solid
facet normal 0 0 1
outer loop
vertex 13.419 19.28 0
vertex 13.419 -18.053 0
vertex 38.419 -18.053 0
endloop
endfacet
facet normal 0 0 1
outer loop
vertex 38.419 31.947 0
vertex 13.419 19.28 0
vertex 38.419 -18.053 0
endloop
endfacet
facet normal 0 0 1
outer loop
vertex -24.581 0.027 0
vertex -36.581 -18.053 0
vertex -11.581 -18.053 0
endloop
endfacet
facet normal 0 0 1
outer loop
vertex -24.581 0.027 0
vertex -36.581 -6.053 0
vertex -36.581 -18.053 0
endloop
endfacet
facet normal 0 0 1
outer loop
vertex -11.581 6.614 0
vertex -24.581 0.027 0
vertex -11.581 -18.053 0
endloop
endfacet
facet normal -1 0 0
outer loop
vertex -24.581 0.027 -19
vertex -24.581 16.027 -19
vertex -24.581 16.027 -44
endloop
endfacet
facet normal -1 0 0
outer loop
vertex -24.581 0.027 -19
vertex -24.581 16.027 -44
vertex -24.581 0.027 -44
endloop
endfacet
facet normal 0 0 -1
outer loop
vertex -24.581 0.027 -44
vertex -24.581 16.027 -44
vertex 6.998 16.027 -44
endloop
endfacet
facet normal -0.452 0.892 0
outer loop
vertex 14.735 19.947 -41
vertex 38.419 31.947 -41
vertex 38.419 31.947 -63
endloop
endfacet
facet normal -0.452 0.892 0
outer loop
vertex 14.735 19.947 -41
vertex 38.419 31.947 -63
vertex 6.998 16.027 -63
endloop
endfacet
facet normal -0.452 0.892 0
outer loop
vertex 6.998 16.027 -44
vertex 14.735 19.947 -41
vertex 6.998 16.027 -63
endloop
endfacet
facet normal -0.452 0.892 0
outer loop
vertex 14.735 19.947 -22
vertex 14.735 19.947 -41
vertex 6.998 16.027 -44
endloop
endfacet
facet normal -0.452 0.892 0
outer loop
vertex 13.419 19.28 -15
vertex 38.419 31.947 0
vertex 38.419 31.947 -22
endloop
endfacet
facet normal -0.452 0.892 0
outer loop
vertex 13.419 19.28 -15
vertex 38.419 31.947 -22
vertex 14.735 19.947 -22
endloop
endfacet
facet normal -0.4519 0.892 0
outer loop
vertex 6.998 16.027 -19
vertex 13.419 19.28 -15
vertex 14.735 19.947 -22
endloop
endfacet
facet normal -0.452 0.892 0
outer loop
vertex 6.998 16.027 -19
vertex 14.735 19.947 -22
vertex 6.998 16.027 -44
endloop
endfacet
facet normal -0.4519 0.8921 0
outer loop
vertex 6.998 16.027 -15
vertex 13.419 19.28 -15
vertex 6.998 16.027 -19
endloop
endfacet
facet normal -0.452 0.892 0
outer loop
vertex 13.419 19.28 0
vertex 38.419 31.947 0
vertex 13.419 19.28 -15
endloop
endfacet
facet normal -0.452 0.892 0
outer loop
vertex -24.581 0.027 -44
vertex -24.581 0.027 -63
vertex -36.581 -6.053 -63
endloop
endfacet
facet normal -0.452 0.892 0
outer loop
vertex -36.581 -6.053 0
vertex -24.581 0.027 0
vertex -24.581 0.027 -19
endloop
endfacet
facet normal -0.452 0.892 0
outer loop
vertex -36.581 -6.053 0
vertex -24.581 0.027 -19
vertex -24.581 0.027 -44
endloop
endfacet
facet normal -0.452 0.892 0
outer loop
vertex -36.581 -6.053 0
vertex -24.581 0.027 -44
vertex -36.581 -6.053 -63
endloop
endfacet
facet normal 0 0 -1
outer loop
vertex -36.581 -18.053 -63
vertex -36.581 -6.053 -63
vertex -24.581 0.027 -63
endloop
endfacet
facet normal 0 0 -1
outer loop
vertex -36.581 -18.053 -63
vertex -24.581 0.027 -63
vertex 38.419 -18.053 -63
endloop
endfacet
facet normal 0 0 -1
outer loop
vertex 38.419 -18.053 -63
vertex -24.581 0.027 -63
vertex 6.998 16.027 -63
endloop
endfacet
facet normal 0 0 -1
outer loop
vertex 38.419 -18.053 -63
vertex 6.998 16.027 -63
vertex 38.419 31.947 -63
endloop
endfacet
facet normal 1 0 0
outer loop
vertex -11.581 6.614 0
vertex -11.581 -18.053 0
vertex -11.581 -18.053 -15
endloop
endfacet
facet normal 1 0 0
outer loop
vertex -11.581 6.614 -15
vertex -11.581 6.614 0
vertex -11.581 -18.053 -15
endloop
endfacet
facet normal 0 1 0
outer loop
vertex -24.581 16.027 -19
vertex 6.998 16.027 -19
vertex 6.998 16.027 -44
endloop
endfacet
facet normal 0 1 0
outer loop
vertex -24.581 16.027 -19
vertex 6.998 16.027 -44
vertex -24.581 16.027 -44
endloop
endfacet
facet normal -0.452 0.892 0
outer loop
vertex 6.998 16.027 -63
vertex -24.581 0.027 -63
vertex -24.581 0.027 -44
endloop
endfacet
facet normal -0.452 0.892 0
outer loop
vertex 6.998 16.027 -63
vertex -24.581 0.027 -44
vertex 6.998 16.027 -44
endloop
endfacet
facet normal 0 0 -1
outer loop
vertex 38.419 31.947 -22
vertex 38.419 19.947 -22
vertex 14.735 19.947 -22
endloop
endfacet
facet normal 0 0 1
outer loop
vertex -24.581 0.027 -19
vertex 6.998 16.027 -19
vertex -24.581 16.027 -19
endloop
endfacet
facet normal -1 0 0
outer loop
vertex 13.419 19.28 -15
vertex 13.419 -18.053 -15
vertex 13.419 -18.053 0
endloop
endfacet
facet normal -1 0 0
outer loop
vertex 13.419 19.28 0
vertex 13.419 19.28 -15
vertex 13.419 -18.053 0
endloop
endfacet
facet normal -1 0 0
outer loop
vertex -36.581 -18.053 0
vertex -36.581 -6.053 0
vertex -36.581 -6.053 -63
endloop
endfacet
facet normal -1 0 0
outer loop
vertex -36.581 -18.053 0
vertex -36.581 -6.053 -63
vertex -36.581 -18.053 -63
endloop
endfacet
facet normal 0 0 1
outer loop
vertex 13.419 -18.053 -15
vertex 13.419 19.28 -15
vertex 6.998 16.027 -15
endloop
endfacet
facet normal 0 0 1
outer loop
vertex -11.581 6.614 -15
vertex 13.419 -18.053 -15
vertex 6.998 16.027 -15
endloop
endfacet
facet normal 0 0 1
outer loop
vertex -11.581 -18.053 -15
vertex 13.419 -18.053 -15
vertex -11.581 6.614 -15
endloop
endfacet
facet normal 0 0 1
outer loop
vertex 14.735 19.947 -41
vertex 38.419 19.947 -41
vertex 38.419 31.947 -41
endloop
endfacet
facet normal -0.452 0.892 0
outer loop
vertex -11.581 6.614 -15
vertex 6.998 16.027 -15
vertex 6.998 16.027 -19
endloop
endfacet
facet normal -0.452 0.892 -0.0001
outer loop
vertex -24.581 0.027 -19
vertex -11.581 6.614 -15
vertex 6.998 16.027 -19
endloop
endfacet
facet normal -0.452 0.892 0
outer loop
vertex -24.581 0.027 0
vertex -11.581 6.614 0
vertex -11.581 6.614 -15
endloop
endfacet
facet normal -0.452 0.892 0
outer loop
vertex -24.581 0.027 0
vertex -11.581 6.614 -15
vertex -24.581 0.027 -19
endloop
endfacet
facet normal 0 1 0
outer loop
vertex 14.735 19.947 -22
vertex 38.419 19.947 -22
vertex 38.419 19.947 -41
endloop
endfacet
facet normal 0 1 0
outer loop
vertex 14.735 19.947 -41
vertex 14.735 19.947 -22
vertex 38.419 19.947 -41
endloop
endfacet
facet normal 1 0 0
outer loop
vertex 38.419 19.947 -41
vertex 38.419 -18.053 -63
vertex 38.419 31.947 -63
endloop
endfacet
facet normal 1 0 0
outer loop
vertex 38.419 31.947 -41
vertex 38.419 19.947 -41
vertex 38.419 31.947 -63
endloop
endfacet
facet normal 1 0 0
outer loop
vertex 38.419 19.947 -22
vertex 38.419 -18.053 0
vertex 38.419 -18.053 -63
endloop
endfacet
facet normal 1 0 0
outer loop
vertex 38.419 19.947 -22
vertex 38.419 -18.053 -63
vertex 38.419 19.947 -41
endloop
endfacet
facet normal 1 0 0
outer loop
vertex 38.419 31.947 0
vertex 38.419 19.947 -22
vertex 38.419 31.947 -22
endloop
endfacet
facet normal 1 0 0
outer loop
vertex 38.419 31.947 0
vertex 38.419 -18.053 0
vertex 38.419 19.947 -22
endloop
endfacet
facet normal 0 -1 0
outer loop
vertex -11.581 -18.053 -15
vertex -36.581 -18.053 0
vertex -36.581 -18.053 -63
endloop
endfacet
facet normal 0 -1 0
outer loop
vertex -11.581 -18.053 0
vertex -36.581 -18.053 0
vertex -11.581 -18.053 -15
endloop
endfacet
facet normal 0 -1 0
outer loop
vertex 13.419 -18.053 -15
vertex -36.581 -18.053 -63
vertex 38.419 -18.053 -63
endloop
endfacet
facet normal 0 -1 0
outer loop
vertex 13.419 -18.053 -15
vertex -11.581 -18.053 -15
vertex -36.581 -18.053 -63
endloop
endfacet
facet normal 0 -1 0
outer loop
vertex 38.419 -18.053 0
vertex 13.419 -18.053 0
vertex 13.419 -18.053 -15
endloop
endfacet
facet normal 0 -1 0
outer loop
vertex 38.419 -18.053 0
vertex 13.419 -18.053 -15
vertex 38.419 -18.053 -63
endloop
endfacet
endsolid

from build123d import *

# Parameters (mm, degrees)
BOSS_EXTRUDE1_DEPTH            = 63
CUT_EXTRUDE1_DEPTH             = 19
CUT_EXTRUDE2_DEPTH             = 19
CUT_EXTRUDE3_REACH             = 36.08
CUT_EXTRUDE3_DIRECTION_2_DEPTH = 16.92
CUT_EXTRUDE4_REACH             = 77
SKETCH6_W                      = 19
SKETCH6_H                      = 12


with BuildPart() as part:
    # Sketch1 → Boss-Extrude1 (new body)
    with BuildSketch(Plane.XY):
        Polygon((38.418907052, 31.947162427), (-36.581092948, -6.052837573), (-36.581092948, -18.052837573), (38.418907052, -18.052837573), align=None)
        Polygon((-24.581092948, 16.027162427), (-24.581092948, 0.027162427), (6.99785442, 16.027162427), align=None)
    extrude(amount=-BOSS_EXTRUDE1_DEPTH)

    # Sketch2 → Cut-Extrude1 (cut)
    with BuildSketch(Plane.XY):
        Polygon((-24.581092948, 16.027162427), (6.99785442, 16.027162427), (-24.581092948, 0.027162427), align=None)
    extrude(amount=-CUT_EXTRUDE1_DEPTH, mode=Mode.SUBTRACT)

    # Sketch3 → Cut-Extrude2 (cut)
    with BuildSketch(Plane(origin=(0, 0, -63), x_dir=(-1, 0, 0), z_dir=(0, 0, -1))):
        Polygon((-6.99785442, 16.027162427), (24.581092948, 16.027162427), (24.581092948, 0.027162427), align=None)
    extrude(amount=-CUT_EXTRUDE2_DEPTH, mode=Mode.SUBTRACT)

    # Sketch4 → Cut-Extrude3 (cut, up to next)
    with BuildSketch(Plane(origin=(0, 16.027162427, 0), x_dir=(1, 0, 0), z_dir=(0, 1, 0)), mode=Mode.PRIVATE) as cut_extrude3_sk1:
        Polygon((-11.581092948, 15), (7.086929483, 15), (13.418907052, 15), (13.418907052, 0), (-11.581092948, 0), align=None)
    cut_extrude3_tool1 = extrude(cut_extrude3_sk1.sketch, amount=-CUT_EXTRUDE3_REACH, mode=Mode.PRIVATE) & part.part
    add(cut_extrude3_tool1.solids().sort_by_distance((0.918907, 16.027162, -7.5))[0], mode=Mode.SUBTRACT)

    # Sketch4 → Cut-Extrude3 direction 2 (cut)
    with BuildSketch(Plane(origin=(0, 16.027162427, 0), x_dir=(1, 0, 0), z_dir=(0, 1, 0))):
        Polygon((-11.581092948, 15), (7.086929483, 15), (13.418907052, 15), (13.418907052, 0), (-11.581092948, 0), align=None)
    extrude(amount=CUT_EXTRUDE3_DIRECTION_2_DEPTH, mode=Mode.SUBTRACT)

    # Sketch6 → Cut-Extrude4 (cut, up to next)
    with BuildSketch(Plane(origin=(38.418907052, 0, 0), x_dir=(0, 0, -1), z_dir=(1, 0, 0)), mode=Mode.PRIVATE) as cut_extrude4_sk1:
        with Locations((31.5, 25.947162427)):
            Rectangle(SKETCH6_W, SKETCH6_H)
    cut_extrude4_tool1 = extrude(cut_extrude4_sk1.sketch, amount=-CUT_EXTRUDE4_REACH, mode=Mode.PRIVATE) & part.part
    add(cut_extrude4_tool1.solids().sort_by_distance((38.418907, 25.947162, -31.5))[0], mode=Mode.SUBTRACT)


solid = part.part
